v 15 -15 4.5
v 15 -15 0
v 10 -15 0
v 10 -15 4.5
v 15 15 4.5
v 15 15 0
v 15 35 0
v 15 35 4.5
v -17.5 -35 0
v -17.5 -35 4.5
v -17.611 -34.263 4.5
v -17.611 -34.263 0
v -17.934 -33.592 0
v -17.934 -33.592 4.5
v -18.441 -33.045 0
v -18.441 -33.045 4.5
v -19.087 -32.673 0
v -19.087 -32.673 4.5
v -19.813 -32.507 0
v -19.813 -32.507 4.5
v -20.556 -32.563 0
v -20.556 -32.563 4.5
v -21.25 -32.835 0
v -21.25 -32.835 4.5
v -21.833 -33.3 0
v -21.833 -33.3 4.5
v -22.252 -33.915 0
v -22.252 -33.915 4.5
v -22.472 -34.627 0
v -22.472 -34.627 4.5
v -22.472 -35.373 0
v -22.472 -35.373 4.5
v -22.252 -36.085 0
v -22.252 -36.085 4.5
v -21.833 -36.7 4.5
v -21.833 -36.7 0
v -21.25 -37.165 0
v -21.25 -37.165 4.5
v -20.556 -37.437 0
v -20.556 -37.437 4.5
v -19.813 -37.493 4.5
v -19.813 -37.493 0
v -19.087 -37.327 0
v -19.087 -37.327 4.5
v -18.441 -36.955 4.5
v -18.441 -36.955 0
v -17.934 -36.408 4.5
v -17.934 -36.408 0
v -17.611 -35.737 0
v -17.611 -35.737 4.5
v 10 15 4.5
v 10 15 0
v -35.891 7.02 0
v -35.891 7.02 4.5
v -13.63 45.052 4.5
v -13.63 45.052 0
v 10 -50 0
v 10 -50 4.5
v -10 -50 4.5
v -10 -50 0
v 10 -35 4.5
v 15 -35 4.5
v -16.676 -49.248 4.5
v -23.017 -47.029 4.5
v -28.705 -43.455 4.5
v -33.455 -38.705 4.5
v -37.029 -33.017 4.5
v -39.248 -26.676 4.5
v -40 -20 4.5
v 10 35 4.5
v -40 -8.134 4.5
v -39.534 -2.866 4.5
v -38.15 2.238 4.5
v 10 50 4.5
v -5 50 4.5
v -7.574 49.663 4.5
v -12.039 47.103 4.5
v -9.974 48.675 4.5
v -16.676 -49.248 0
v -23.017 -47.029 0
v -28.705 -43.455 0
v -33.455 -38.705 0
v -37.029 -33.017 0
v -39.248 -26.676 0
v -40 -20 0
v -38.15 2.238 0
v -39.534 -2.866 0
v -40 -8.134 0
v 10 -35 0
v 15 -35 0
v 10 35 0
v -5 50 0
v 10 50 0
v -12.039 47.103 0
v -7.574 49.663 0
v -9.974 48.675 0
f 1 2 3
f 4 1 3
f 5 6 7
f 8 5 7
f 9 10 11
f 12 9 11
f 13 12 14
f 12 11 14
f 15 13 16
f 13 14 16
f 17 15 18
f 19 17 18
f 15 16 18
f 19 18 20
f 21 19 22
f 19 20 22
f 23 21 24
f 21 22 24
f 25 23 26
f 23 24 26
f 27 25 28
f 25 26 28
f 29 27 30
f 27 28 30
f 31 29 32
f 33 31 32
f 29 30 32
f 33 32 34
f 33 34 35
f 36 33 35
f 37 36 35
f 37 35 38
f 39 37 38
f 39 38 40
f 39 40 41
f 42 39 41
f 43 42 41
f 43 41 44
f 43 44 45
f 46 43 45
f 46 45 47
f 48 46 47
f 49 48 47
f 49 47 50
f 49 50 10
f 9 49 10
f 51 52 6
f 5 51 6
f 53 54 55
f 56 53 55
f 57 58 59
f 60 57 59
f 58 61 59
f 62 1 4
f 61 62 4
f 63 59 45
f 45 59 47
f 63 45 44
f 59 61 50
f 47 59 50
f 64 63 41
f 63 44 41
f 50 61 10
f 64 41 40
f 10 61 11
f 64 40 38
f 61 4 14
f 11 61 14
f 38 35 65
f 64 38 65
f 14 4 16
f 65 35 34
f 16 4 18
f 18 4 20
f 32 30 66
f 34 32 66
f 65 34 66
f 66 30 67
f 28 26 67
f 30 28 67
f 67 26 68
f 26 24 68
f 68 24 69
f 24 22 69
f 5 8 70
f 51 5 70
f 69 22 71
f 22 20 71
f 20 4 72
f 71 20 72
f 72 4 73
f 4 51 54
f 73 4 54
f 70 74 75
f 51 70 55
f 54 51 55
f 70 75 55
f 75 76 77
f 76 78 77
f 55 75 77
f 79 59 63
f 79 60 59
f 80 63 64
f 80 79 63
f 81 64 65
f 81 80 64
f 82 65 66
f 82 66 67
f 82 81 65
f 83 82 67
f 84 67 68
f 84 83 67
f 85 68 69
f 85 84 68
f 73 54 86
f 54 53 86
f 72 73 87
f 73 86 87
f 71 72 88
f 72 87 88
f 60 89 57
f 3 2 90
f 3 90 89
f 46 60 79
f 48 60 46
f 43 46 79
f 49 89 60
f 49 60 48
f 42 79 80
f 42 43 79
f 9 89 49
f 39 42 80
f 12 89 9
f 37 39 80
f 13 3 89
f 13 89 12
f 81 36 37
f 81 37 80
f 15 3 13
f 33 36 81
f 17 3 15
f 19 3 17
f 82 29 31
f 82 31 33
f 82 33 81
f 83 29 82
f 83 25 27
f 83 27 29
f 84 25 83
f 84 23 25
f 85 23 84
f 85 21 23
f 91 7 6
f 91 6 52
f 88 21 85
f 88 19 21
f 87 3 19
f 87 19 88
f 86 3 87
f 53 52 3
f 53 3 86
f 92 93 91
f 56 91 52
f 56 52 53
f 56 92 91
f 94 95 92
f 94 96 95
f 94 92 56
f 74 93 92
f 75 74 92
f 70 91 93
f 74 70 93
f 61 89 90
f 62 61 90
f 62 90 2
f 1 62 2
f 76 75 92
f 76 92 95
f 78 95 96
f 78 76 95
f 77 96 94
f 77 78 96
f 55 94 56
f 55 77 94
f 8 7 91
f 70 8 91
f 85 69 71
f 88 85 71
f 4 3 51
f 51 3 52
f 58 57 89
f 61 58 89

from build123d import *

# Parameters (mm, degrees)
BOSS_EXTRUDE1_DEPTH = 4.5
FILLET1_R           = 10
BOSS_EXTRUDE2_DEPTH = 4.5
FILLET2_R           = 30
SKETCH3_R           = 2.5
CUT_EXTRUDE1_DEPTH  = 5


with BuildPart() as part:
    # Sketch1 → Boss-Extrude1 (new body)
    with BuildSketch(Plane.XY):
        Polygon((10, -15), (10, 0), (10, 15), (15, 15), (15, 35), (10, 35), (10, 50), (-15, 50), (-15, -50), (10, -50), (10, -35), (15, -35), (15, -15), align=None)
    extrude(amount=BOSS_EXTRUDE1_DEPTH)

    # Fillet1
    fillet1_edges = [part.edges().sort_by_distance(p)[0] for p in [
        (-15, -50, 2.25),
        (-15, 50, 2.25),
    ]]
    fillet(fillet1_edges, radius=FILLET1_R)

    # Sketch2 → Boss-Extrude2 (add)
    with BuildSketch(Plane.XY.offset(4.5)):
        with BuildLine():
            Line((-40, 0), (-13.630305493, 45.051517306))
            ThreePointArc((-13.630305493, 45.051517306), (-14.651503897, 42.616958642), (-15, 40))
            Line((-15, 40), (-15, -40))
            ThreePointArc((-15, -40), (-12.071067812, -47.071067812), (-5, -50))
            Line((-5, -50), (-40, -50))
            Line((-40, -50), (-40, 0))
        make_face()
    extrude(amount=-BOSS_EXTRUDE2_DEPTH)

    # Fillet2
    fillet2_edges = [part.edges().sort_by_distance(p)[0] for p in [
        (-40, -50, 2.25),
        (-40, 0, 2.25),
    ]]
    fillet(fillet2_edges, radius=FILLET2_R)

    # Sketch3 → Cut-Extrude1 (cut)
    with BuildSketch(Plane.XY.offset(4.5)):
        with Locations((-20, -35)):
            Circle(SKETCH3_R)
    extrude(amount=-CUT_EXTRUDE1_DEPTH, mode=Mode.SUBTRACT)


solid = part.part
